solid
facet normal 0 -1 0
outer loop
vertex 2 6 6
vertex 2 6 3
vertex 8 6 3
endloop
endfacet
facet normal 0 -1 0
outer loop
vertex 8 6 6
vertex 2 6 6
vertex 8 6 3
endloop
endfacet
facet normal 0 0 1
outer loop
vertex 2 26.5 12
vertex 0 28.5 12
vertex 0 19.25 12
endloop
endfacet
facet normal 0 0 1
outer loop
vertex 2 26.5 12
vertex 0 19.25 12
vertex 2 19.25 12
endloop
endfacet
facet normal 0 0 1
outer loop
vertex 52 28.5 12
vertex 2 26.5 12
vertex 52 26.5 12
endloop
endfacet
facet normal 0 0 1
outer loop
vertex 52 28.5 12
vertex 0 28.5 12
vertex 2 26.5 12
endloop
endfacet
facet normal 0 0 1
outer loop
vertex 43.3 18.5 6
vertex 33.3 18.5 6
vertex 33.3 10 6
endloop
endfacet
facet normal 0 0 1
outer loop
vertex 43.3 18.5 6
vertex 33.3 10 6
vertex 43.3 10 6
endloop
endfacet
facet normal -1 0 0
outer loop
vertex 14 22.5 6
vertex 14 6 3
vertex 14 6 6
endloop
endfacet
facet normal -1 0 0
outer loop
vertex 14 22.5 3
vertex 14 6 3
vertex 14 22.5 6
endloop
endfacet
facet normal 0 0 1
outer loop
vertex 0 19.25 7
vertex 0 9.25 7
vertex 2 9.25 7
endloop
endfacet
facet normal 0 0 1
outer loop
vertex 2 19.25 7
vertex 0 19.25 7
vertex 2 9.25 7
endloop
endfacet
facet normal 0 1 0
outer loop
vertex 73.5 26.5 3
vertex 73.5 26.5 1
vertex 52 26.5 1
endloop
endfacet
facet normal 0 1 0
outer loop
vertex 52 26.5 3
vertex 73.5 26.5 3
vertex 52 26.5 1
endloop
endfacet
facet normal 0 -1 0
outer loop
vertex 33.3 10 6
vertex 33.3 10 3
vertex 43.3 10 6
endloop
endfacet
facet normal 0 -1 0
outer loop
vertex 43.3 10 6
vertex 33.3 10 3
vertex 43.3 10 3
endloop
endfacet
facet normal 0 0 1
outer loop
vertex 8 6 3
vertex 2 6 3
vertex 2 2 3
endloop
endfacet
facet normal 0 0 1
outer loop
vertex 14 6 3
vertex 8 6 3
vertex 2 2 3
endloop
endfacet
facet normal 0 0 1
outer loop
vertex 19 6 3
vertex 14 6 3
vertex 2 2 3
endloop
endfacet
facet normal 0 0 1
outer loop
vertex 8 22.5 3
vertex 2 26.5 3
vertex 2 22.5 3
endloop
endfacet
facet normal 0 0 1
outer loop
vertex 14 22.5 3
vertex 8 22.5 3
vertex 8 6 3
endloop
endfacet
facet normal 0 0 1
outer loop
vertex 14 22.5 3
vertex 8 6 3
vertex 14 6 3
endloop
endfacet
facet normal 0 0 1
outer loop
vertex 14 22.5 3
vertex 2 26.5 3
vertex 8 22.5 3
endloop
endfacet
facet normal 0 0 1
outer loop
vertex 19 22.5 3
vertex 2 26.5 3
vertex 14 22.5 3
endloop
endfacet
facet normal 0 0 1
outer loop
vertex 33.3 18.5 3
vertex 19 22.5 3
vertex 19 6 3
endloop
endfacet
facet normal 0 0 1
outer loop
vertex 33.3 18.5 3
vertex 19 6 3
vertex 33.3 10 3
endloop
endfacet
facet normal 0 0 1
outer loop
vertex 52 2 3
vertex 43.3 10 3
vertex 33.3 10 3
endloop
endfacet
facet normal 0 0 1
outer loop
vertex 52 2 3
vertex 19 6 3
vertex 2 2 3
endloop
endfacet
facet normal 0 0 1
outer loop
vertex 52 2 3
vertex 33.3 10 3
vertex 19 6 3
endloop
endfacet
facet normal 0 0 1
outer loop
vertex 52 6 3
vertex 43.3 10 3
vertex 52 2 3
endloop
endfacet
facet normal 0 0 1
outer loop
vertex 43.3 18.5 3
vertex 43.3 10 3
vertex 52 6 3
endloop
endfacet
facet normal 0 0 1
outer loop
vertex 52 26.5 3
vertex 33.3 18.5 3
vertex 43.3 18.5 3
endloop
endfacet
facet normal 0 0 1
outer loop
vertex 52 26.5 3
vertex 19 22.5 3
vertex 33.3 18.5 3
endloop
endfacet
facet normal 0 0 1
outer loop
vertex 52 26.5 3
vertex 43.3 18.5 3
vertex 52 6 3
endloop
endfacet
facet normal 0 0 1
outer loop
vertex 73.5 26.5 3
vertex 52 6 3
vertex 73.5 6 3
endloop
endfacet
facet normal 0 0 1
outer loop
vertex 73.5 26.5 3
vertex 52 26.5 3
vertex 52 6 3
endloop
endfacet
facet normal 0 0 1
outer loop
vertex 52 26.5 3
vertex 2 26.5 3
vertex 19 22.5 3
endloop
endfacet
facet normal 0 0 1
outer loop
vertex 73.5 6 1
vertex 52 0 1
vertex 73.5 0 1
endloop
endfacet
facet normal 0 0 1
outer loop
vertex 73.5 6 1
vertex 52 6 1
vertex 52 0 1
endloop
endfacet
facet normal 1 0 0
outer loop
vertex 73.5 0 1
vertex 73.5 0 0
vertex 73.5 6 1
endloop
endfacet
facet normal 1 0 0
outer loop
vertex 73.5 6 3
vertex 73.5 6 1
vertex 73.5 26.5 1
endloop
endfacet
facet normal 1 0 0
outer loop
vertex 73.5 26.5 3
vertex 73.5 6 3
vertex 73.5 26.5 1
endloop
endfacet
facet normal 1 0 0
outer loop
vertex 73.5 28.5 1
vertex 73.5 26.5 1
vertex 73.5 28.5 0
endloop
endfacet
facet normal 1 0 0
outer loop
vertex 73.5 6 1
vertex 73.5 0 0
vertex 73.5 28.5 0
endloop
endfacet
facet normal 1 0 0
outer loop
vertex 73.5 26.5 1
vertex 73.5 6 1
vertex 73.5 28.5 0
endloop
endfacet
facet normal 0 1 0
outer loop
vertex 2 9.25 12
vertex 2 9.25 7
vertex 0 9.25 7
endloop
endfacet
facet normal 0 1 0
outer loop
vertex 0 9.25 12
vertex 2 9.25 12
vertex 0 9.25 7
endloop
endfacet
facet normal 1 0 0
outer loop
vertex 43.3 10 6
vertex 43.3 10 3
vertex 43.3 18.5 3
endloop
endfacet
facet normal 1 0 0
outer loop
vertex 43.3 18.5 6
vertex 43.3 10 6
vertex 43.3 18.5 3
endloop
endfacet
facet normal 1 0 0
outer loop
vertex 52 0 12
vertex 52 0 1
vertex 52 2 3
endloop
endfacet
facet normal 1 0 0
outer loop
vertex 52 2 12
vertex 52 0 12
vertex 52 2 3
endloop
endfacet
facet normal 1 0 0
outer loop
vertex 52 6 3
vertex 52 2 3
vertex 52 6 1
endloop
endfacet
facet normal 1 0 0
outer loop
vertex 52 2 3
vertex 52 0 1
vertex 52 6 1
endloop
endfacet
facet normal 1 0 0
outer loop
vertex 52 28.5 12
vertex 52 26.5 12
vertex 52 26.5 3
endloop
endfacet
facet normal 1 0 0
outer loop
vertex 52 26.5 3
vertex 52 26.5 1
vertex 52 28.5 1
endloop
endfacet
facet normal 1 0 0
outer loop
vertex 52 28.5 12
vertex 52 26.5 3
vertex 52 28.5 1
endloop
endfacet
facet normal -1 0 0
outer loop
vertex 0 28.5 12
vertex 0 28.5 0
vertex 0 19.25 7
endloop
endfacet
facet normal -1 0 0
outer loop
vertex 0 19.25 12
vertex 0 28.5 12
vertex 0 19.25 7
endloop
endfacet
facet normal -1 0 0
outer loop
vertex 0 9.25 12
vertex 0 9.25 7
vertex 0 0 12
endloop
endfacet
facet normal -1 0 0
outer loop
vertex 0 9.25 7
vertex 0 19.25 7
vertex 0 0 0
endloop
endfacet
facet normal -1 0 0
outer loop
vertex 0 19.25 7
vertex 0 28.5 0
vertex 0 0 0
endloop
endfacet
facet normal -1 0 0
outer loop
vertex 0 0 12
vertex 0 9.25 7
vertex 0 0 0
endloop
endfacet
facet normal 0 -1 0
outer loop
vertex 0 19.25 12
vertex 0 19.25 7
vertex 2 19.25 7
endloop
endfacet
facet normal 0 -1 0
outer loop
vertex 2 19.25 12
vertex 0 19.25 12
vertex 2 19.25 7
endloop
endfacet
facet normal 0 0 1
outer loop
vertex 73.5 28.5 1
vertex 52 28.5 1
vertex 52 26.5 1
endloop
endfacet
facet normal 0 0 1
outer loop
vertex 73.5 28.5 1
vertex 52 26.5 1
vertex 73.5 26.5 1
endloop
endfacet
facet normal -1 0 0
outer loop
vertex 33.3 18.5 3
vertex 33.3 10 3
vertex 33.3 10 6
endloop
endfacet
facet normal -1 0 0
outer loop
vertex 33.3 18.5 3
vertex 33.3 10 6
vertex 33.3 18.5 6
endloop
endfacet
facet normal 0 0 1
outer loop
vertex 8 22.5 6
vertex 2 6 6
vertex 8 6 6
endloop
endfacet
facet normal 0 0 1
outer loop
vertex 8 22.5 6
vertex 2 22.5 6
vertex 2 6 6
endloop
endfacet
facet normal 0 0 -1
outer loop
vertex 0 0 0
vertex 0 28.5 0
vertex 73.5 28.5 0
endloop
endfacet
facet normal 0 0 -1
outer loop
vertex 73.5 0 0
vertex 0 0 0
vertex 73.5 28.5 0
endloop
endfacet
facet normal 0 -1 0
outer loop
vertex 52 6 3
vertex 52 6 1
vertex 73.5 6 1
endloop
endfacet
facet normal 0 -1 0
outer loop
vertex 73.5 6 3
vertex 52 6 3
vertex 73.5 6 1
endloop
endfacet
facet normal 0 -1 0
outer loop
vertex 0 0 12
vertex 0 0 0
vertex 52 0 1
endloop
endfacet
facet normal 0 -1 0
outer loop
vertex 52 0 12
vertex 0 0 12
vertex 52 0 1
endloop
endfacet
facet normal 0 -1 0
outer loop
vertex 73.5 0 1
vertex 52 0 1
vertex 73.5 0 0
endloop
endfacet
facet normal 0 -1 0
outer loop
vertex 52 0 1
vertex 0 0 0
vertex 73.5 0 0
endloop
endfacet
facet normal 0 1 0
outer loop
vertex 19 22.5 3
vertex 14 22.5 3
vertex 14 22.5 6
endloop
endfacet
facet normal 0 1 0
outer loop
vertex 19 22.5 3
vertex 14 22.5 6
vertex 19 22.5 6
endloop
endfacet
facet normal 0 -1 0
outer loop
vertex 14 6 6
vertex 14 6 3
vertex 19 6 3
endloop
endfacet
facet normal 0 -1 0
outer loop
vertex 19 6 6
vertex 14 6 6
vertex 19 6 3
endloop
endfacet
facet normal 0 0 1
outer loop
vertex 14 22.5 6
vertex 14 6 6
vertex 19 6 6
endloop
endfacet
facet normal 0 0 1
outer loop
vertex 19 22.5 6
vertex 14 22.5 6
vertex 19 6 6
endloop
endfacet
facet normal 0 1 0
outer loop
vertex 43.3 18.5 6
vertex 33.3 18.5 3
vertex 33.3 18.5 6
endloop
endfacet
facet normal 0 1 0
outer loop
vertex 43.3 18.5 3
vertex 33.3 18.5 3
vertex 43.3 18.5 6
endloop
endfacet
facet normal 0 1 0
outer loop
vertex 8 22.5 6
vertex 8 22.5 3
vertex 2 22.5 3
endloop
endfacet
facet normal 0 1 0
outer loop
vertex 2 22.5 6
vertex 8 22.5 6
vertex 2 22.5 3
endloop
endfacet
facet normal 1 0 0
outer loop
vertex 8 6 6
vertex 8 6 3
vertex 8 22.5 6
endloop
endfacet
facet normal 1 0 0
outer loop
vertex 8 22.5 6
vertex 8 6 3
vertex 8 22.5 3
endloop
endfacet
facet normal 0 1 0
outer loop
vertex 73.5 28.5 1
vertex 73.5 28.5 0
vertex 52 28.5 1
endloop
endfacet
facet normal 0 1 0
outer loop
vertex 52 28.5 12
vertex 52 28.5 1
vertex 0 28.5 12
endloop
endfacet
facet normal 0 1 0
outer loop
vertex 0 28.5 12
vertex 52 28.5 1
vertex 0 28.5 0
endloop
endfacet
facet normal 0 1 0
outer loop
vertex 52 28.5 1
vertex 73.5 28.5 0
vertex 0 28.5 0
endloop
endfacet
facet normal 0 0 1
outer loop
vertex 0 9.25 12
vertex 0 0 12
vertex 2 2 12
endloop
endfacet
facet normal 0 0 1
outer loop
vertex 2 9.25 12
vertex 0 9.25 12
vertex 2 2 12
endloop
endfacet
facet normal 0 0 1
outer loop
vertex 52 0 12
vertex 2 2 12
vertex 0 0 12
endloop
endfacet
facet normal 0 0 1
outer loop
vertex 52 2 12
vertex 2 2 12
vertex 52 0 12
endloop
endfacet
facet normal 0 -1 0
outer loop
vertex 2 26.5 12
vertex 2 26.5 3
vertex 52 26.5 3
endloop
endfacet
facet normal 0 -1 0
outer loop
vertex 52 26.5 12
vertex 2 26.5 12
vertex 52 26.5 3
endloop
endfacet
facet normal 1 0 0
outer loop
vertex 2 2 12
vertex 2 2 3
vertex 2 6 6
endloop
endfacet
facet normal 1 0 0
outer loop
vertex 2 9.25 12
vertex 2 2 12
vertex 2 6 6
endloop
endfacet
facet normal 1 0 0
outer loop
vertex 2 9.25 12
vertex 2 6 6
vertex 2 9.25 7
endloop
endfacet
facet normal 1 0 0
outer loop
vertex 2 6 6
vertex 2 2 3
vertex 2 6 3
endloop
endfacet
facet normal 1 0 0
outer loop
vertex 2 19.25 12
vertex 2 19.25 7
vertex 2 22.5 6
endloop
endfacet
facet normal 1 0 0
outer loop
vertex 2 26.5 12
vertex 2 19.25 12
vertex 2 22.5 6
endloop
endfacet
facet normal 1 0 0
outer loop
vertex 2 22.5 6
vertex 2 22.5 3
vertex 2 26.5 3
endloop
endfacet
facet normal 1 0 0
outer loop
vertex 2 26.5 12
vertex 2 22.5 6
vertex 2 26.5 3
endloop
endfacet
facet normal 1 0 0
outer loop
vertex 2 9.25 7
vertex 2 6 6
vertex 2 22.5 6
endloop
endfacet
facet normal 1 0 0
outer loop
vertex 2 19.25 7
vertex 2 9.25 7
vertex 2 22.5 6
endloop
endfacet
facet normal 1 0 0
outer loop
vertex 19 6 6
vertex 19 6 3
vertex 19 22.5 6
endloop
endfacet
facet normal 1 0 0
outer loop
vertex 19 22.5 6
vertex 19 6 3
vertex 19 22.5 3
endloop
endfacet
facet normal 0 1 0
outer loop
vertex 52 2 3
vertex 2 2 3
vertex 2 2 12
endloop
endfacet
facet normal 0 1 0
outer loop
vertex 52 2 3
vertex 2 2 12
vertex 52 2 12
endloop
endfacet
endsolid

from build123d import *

# Parameters (mm, degrees)
F0_W     = 19
F0_H     = 20.5
F0_W_2   = 5
F0_H_2   = 16.5
F0_W_3   = 10
F0_H_3   = 8.5
F0_W_4   = 2.5
F1_DEPTH = 3
F2_DEPTH = 6
F0_W_5   = 2
F0_H_4   = 10
F3_DEPTH = 7
F0_W_6   = 50
F0_H_5   = 2
F4_DEPTH = 12
F5_DEPTH = 1


with BuildPart() as f1:
    # F0 (on Top) → F1 (new body)
    with BuildSketch(Plane.XY):
        with Locations((61.5, 16.25)):
            Rectangle(F0_W, F0_H)
        Polygon((2, 6), (2, 2), (52, 2), (52, 6), (52, 26.5), (2, 26.5), (2, 22.5), (8, 22.5), (8, 6), align=None)
        with Locations((16.5, 14.25)):
            Rectangle(F0_W_2, F0_H_2, mode=Mode.SUBTRACT)
        with Locations((38.3, 14.25)):
            Rectangle(F0_W_3, F0_H_3, mode=Mode.SUBTRACT)
        with Locations((72.25, 16.25)):
            Rectangle(F0_W_4, F0_H)
    extrude(amount=F1_DEPTH)

    # F0 (on Top) → F2 (join)
    with BuildSketch(Plane.XY):
        Polygon((2, 19.25), (2, 9.25), (2, 6), (8, 6), (8, 22.5), (2, 22.5), align=None)
        with Locations((16.5, 14.25)):
            Rectangle(F0_W_2, F0_H_2)
        with Locations((38.3, 14.25)):
            Rectangle(F0_W_3, F0_H_3)
    extrude(amount=F2_DEPTH)

    # F0 (on Top) → F3 (join)
    with BuildSketch(Plane.XY):
        with Locations((1, 14.25)):
            Rectangle(F0_W_5, F0_H_4)
    extrude(amount=F3_DEPTH)

    # F0 (on Top) → F4 (join)
    with BuildSketch(Plane.XY):
        with Locations((27, 27.5)):
            Rectangle(F0_W_6, F0_H_5)
        Polygon((0, 28.5), (0, 19.25), (2, 19.25), (2, 22.5), (2, 26.5), (2, 28.5), align=None)
        Polygon((0, 9.25), (0, 0), (2, 0), (2, 2), (2, 6), (2, 9.25), align=None)
        with Locations((27, 1)):
            Rectangle(F0_W_6, F0_H_5)
    extrude(amount=F4_DEPTH)

    # F0 (on Top) → F5 (join)
    with BuildSketch(Plane.XY):
        Polygon((52, 28.5), (52, 26.5), (71, 26.5), (73.5, 26.5), (73.5, 28.5), align=None)
        Polygon((52, 2), (52, 0), (73.5, 0), (73.5, 6), (71, 6), (52, 6), align=None)
    extrude(amount=F5_DEPTH)


solid = f1.part
